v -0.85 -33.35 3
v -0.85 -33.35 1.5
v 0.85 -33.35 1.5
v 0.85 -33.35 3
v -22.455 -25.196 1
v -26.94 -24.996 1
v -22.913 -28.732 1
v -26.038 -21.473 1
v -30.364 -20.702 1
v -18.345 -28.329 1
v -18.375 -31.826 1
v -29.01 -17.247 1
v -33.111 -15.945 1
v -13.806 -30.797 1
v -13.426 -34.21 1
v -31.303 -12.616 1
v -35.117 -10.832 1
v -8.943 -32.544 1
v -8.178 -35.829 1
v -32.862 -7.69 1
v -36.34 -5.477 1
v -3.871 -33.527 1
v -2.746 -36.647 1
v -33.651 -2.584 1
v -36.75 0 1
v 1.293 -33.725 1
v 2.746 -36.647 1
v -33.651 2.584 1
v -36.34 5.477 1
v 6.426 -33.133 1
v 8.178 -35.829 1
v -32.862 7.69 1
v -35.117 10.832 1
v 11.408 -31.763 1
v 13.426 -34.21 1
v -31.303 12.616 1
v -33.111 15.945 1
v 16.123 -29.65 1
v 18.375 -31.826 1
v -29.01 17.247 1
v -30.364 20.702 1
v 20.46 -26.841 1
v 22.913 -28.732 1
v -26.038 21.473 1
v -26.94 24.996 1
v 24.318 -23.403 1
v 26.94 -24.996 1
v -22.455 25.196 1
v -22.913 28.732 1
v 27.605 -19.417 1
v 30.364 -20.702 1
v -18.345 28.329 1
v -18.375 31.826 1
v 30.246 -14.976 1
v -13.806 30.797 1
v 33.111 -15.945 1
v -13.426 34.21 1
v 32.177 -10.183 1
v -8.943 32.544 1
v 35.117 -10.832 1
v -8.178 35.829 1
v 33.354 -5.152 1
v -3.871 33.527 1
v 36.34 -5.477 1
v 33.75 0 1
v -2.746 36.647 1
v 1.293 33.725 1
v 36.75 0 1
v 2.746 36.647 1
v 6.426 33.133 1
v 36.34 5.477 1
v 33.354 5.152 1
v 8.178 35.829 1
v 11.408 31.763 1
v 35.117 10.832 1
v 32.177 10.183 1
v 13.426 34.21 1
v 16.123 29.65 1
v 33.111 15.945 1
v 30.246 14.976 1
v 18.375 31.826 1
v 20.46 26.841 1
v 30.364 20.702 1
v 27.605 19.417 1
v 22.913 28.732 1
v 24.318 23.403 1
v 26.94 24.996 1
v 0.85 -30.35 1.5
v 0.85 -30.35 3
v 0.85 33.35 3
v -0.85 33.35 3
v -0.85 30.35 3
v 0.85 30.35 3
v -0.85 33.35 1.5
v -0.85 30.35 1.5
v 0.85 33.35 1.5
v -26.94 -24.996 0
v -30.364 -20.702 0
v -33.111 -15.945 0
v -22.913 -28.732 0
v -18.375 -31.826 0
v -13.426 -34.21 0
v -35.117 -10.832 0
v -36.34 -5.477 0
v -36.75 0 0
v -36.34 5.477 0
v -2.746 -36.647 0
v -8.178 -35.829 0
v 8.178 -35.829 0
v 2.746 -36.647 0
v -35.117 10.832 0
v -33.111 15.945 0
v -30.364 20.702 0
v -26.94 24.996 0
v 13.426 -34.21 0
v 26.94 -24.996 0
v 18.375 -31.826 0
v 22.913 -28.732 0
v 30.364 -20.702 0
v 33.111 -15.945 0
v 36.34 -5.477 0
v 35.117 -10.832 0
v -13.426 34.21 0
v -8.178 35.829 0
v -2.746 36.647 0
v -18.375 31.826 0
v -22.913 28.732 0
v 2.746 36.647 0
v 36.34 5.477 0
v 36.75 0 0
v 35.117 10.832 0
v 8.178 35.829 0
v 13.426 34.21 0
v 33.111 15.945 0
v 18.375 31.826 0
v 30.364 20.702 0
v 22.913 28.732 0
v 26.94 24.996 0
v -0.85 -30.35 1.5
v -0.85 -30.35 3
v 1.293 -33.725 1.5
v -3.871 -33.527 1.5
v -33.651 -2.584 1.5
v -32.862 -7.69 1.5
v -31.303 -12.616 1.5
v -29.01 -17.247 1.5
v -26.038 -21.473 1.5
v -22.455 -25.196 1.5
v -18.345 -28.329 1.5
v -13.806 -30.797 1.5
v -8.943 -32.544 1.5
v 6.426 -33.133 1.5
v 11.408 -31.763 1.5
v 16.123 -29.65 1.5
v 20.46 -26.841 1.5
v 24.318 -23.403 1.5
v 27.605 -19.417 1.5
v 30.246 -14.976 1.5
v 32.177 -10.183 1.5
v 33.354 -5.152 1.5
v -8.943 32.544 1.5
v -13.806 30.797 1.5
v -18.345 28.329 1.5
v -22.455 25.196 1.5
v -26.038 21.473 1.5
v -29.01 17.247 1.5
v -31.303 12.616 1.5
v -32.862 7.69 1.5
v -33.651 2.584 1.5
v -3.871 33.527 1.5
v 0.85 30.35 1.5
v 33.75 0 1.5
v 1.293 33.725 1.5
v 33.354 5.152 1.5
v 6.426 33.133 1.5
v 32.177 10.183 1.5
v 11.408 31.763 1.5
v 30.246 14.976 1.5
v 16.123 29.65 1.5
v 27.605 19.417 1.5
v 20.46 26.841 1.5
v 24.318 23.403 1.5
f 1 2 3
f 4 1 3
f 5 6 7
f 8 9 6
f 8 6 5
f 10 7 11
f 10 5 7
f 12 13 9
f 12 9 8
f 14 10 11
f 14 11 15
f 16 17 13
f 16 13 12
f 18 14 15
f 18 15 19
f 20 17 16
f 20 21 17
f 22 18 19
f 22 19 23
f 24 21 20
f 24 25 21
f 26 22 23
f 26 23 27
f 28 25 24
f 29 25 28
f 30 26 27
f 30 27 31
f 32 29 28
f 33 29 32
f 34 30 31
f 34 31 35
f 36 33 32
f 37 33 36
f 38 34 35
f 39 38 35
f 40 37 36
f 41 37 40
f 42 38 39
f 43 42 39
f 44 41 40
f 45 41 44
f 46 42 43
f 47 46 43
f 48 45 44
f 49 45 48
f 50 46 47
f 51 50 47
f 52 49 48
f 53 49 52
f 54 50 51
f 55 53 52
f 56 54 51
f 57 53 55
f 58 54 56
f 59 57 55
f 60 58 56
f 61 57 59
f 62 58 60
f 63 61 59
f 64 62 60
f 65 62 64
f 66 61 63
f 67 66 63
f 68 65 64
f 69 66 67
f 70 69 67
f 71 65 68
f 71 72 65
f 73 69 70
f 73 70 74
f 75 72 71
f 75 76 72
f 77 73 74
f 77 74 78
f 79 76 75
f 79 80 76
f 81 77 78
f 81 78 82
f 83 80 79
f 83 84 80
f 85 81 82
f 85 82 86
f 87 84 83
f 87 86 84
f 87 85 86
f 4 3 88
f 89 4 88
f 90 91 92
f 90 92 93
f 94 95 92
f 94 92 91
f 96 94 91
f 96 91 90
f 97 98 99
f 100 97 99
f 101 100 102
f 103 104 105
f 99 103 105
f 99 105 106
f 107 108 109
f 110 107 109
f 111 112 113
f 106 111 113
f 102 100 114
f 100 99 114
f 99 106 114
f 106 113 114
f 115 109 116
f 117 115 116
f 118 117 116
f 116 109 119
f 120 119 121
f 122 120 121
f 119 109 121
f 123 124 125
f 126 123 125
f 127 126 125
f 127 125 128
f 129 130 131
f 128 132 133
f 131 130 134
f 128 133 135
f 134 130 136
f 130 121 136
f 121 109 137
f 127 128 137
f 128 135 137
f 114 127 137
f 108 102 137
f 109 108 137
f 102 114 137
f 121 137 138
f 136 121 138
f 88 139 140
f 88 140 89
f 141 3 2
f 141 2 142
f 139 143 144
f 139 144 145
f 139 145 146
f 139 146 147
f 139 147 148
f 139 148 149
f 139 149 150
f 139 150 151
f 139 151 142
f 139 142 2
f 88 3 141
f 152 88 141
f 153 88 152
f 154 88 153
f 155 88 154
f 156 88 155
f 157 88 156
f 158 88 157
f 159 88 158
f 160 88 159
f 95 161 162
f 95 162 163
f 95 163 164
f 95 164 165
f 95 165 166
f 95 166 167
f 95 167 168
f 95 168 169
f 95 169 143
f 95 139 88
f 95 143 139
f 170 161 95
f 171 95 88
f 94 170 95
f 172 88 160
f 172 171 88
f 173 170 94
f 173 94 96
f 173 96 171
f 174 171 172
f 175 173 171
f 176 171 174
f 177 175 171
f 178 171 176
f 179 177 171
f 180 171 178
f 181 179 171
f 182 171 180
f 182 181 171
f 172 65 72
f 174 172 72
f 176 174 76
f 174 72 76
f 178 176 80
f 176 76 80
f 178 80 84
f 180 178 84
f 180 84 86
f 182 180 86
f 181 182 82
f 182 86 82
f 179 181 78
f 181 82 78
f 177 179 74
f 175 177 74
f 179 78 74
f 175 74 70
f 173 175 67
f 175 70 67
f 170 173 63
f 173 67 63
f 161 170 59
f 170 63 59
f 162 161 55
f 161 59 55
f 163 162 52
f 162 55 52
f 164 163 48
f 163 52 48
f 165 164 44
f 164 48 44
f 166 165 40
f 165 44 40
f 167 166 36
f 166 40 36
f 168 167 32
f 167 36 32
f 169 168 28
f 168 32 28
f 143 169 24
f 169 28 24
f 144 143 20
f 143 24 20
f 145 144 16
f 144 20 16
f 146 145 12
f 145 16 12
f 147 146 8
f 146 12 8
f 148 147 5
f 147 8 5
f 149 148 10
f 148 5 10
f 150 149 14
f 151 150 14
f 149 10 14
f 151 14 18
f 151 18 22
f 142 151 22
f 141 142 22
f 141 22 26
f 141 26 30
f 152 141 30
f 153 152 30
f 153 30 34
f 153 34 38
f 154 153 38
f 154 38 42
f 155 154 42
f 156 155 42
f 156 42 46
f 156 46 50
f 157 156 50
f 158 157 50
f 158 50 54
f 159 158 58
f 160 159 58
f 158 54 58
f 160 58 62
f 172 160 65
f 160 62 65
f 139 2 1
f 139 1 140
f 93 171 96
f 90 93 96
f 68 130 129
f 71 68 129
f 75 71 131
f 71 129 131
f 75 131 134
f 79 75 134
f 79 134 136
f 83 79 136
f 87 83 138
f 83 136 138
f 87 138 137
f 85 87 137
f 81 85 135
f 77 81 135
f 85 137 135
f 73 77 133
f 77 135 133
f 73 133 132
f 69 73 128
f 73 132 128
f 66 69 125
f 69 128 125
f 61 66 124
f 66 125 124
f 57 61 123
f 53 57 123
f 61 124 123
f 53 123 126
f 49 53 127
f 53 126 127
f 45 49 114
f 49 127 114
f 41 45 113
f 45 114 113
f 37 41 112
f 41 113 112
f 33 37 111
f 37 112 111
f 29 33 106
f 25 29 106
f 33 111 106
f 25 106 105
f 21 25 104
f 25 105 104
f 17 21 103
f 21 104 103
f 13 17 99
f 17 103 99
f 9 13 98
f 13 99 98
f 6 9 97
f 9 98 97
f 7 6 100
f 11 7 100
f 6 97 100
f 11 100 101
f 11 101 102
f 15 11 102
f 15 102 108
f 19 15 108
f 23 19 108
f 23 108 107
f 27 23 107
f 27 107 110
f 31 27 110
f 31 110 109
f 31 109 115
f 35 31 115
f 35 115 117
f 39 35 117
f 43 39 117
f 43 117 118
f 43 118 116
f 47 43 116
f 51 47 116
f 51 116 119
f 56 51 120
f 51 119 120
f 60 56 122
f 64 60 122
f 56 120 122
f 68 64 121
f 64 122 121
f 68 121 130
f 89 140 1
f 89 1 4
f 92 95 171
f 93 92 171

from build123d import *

# Parameters (mm, degrees)
F0_R     = 36.75
F1_DEPTH = 1
F2_R     = 33.75
F2_W     = 1.7
F2_H     = 3
F3_DEPTH = 0.5
F4_DEPTH = 2


with BuildPart() as f1:
    # F0 (on Top) → F1 (new body)
    with BuildSketch(Plane.XY):
        Circle(F0_R)
    extrude(amount=F1_DEPTH)

    # F2 (on face) → F3 (join)
    with BuildSketch(Plane.XY.offset(1)):
        Circle(F2_R)
        with Locations((0, -31.85)):
            Rectangle(F2_W, F2_H, mode=Mode.SUBTRACT)
        with Locations((0, 31.85)):
            Rectangle(F2_W, F2_H, mode=Mode.SUBTRACT)
    extrude(amount=F3_DEPTH)

    # F4 (add): faces of the model
    f4_faces = [f1.faces().sort_by_distance(p)[0] for p in [
        (0, -31.85, 1),
        (0, 31.85, 1),
    ]]
    extrude(f4_faces, amount=F4_DEPTH)


solid = f1.part
